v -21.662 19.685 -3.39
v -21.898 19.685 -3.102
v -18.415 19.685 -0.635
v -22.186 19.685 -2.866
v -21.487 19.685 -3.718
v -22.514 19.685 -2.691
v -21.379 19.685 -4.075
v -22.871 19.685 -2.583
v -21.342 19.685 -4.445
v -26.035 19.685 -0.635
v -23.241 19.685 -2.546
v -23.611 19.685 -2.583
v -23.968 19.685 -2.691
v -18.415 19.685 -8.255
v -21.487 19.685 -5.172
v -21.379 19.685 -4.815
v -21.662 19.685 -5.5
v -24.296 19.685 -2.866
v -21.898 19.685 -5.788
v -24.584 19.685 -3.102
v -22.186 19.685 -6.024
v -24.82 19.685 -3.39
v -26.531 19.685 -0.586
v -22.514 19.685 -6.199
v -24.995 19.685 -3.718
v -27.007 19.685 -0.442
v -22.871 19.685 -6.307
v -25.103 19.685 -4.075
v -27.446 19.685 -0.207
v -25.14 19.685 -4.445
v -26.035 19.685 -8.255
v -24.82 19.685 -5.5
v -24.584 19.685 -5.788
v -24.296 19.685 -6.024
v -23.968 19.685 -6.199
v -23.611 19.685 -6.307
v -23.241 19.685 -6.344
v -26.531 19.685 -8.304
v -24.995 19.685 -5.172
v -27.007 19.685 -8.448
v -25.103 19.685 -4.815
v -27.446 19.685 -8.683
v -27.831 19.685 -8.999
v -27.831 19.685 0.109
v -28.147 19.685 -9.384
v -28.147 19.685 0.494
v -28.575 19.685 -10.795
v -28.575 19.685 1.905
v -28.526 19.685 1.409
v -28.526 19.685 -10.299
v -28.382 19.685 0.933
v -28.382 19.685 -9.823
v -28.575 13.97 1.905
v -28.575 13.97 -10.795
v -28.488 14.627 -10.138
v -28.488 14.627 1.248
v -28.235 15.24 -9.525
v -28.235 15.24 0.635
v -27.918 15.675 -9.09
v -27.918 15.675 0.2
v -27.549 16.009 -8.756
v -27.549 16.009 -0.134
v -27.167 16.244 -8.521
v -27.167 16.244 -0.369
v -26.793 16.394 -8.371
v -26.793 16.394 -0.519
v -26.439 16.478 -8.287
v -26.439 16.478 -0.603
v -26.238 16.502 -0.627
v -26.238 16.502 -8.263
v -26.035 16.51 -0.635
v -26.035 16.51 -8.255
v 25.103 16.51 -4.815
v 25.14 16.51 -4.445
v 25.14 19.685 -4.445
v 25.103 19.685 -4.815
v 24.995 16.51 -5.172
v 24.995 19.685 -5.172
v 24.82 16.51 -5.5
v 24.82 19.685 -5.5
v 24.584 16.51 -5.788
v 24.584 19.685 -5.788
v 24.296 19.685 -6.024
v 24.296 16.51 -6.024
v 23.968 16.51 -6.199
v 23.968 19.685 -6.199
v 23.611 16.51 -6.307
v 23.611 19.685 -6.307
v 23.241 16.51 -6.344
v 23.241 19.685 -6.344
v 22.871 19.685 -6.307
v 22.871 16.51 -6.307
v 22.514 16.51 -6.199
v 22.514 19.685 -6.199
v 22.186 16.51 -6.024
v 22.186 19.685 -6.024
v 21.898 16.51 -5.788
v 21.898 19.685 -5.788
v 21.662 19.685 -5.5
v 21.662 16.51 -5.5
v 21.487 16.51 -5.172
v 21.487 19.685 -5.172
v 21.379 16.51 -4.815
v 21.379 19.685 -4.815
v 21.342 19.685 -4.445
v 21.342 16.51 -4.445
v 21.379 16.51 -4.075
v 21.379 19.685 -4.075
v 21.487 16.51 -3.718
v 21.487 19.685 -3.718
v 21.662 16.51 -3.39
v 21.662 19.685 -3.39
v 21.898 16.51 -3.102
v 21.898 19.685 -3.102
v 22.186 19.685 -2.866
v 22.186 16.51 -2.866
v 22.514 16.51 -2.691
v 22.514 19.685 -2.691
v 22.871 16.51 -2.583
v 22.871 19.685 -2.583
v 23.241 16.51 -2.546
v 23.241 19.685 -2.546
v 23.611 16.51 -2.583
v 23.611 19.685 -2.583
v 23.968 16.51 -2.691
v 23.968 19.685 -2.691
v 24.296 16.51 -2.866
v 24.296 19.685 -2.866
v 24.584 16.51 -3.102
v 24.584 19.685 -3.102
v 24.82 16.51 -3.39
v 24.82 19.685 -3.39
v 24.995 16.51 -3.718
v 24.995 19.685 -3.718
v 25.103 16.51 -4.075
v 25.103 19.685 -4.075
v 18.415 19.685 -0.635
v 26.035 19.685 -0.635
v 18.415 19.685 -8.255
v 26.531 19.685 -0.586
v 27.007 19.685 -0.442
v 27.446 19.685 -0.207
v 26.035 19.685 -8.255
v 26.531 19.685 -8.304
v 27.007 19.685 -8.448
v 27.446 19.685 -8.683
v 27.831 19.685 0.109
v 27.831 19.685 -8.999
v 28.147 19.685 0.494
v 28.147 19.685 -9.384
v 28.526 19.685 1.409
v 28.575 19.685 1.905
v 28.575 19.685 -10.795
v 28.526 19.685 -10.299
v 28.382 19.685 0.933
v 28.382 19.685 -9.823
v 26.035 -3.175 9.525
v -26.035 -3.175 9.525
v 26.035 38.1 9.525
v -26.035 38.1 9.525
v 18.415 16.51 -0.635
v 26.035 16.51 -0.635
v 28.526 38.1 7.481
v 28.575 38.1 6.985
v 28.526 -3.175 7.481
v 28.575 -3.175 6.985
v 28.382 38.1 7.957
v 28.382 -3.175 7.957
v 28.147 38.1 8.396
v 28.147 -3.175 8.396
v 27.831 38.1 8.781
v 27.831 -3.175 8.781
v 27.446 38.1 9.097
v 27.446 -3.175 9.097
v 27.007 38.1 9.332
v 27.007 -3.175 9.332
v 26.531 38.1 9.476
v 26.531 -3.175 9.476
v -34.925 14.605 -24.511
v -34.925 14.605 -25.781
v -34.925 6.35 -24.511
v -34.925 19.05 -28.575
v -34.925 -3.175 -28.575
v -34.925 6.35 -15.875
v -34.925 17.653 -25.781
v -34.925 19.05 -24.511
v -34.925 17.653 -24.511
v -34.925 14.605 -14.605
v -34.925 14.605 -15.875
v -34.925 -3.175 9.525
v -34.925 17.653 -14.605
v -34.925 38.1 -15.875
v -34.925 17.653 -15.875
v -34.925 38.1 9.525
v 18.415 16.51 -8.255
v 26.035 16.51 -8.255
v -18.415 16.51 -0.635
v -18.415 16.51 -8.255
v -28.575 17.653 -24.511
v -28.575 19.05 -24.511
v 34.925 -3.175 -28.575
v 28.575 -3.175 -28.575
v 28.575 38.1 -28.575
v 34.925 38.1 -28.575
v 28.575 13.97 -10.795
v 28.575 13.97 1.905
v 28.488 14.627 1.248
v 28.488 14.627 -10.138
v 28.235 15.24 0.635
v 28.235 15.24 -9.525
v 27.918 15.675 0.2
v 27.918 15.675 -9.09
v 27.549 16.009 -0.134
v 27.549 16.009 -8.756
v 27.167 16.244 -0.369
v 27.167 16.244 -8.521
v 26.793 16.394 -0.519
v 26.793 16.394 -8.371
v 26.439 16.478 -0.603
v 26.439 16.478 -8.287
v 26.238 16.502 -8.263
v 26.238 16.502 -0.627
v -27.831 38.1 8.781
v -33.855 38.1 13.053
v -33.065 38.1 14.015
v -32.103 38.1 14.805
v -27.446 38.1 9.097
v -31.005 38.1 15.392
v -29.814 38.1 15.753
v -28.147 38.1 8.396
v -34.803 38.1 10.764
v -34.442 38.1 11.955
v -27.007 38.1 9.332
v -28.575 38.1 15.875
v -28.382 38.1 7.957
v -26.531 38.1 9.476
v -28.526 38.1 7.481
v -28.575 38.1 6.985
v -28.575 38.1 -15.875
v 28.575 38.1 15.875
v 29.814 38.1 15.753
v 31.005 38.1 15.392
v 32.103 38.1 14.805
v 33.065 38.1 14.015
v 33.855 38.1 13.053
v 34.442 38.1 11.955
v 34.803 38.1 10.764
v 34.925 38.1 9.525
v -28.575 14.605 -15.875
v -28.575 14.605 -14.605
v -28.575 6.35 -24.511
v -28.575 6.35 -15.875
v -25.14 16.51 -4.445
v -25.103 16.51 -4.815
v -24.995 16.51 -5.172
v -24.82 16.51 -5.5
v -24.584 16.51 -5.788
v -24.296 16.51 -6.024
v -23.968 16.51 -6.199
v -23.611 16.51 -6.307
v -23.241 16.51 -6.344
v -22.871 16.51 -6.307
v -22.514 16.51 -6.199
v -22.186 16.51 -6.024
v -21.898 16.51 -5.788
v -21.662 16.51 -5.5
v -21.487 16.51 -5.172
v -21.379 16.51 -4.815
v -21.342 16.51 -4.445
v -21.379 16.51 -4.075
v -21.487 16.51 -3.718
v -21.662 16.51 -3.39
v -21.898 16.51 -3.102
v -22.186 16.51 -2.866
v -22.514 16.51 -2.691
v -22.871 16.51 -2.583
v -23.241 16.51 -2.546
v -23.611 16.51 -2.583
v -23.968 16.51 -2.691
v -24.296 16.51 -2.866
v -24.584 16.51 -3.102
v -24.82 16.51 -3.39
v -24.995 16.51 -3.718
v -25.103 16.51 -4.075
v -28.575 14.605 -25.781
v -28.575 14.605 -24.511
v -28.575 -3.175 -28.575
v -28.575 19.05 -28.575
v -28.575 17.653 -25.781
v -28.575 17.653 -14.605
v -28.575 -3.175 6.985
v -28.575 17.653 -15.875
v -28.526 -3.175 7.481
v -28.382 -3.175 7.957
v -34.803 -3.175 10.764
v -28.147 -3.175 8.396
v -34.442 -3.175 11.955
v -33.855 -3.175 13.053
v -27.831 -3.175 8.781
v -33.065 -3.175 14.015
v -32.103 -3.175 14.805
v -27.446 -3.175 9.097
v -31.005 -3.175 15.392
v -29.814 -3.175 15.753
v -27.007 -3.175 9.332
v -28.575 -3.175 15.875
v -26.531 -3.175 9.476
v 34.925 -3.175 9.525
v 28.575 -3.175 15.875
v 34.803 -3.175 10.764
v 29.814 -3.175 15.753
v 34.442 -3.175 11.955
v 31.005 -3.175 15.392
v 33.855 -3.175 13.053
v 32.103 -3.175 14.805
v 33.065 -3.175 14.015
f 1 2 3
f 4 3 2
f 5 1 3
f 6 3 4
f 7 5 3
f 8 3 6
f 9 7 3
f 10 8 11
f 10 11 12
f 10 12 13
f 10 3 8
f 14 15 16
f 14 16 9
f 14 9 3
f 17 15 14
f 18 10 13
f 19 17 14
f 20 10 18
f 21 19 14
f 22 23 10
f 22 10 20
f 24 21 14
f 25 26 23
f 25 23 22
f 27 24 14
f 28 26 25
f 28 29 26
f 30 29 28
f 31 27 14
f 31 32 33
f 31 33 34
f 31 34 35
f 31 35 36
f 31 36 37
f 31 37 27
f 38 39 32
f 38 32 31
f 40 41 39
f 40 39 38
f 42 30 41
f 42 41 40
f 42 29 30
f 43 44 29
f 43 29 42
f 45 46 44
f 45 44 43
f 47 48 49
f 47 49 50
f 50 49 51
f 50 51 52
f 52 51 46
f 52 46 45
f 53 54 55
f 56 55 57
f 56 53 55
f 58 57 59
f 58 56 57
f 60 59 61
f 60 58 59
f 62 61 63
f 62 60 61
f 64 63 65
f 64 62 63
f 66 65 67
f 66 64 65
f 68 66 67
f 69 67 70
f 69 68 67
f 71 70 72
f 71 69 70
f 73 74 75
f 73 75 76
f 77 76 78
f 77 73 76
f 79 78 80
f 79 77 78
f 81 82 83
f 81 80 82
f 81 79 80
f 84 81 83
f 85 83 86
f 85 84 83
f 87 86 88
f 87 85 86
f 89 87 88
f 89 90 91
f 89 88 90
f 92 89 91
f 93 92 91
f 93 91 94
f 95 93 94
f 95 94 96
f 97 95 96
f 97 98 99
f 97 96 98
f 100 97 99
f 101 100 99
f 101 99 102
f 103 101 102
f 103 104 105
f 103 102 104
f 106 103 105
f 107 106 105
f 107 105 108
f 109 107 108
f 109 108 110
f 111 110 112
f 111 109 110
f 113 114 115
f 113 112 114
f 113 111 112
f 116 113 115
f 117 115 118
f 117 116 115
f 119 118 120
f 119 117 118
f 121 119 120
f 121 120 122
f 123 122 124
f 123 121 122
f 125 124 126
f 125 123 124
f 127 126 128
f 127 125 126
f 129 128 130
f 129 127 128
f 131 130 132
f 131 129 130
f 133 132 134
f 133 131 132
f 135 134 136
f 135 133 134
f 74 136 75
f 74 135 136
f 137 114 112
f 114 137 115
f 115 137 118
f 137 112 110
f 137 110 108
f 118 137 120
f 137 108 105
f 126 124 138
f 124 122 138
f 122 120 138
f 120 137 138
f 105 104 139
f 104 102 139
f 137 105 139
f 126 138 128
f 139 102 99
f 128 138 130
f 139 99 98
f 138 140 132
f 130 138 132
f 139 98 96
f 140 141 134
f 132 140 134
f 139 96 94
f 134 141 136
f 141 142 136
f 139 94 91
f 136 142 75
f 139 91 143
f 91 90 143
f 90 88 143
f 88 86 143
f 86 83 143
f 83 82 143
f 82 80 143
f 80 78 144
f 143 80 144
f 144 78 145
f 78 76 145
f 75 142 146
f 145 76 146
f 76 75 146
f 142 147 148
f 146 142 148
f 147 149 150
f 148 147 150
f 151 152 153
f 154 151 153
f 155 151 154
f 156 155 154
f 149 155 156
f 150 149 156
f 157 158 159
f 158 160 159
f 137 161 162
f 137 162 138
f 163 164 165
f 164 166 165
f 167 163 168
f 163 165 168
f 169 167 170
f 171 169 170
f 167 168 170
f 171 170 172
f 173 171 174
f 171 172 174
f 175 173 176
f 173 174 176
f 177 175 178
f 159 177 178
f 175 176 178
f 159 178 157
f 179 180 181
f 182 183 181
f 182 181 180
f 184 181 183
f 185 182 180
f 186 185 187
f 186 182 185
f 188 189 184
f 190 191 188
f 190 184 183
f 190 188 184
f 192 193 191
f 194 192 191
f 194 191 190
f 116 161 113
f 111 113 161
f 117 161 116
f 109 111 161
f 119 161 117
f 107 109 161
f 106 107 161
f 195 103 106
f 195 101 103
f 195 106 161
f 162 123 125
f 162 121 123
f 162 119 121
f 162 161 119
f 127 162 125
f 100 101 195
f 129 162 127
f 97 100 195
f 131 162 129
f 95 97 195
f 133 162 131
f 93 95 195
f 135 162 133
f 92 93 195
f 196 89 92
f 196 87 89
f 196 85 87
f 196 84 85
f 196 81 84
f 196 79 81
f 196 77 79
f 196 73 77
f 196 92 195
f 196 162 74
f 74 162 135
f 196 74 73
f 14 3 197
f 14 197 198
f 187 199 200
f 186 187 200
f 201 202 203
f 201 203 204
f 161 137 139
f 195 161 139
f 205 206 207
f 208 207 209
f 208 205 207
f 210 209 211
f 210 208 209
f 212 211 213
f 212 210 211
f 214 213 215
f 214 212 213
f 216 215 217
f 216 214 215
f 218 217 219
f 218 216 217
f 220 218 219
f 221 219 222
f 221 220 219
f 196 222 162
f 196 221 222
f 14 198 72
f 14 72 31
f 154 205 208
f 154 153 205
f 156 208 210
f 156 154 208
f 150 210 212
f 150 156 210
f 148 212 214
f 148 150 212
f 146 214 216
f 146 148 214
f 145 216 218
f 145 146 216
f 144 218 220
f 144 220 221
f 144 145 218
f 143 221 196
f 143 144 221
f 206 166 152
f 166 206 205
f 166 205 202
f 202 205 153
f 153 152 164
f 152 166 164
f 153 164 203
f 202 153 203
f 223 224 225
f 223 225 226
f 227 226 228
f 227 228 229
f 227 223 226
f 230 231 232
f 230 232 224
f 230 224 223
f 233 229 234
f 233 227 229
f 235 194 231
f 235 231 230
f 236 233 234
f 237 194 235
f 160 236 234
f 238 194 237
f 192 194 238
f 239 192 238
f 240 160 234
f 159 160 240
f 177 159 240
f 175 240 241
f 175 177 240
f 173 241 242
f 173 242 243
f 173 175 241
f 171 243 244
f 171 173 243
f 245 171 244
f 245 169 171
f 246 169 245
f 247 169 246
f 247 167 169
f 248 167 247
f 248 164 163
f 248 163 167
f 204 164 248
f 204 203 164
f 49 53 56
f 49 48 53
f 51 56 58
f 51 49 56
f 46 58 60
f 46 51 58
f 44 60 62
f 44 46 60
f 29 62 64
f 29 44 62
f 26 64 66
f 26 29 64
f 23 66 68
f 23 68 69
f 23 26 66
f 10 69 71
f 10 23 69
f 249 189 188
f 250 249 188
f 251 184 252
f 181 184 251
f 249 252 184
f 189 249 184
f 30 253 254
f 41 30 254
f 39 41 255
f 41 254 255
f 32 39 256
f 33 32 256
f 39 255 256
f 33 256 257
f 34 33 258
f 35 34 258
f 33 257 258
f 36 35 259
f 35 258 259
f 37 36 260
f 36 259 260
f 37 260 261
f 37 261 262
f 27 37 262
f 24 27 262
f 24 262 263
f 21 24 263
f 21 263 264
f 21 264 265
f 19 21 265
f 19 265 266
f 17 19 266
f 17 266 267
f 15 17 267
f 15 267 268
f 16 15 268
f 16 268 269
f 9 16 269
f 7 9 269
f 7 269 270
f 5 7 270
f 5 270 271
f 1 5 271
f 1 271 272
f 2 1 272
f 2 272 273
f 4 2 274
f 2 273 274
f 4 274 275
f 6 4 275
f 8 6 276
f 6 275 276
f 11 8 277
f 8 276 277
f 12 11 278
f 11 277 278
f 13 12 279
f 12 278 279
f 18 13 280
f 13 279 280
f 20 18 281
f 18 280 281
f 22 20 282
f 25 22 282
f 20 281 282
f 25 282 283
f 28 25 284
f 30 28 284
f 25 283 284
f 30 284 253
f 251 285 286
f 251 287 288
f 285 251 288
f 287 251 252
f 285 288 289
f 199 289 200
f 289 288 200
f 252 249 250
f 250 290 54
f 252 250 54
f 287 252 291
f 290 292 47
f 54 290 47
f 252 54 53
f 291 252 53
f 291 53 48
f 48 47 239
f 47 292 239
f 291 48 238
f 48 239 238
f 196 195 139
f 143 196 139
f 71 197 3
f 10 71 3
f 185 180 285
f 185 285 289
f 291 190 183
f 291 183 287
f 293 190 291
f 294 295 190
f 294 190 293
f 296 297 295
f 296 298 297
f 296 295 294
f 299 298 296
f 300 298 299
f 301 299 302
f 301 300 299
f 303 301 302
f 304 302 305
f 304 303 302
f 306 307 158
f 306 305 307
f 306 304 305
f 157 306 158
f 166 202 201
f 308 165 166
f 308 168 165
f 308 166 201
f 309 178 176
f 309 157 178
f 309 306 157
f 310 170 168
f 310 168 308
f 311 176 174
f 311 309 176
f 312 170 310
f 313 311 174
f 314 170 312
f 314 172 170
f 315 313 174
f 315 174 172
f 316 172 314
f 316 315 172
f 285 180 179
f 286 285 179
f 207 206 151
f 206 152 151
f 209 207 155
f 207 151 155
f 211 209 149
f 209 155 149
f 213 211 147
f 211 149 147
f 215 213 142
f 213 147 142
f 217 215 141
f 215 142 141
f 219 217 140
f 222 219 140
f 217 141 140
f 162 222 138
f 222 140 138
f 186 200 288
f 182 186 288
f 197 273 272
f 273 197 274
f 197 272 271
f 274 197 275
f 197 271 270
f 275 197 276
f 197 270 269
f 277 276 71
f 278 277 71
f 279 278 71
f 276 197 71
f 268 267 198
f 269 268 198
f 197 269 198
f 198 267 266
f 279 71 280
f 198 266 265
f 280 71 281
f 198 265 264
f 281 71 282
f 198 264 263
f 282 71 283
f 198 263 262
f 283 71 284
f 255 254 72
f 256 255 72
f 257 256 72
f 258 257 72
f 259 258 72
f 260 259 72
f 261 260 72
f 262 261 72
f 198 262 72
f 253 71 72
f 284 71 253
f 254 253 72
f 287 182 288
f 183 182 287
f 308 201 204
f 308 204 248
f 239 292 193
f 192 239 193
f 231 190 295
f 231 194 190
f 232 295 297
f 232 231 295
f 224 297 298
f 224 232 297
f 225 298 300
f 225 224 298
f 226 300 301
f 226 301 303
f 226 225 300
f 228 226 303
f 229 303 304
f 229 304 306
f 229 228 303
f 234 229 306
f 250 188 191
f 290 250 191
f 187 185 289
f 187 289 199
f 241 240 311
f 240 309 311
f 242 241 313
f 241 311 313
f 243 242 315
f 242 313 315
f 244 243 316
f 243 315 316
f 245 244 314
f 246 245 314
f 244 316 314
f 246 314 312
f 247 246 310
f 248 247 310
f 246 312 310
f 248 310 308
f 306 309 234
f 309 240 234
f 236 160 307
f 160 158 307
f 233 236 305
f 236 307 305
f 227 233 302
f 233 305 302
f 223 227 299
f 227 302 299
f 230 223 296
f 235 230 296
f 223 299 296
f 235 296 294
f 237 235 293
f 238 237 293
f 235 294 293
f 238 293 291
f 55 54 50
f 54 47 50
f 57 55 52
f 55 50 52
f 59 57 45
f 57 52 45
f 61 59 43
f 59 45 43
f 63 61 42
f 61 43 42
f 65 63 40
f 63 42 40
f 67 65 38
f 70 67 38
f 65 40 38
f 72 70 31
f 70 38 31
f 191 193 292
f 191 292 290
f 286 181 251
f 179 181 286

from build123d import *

# Parameters (mm, degrees)
BOSS_EXTRUDE1_DEPTH   = 38.1
SKETCH5_W             = 7.62
SKETCH5_H             = 3.175
BOSS_EXTRUDE2_DEPTH   = 10.16
F_6_CLEARANCE_HOLE1_D = 3.7973
BOSS_EXTRUDE3_DEPTH   = 3.175
FILLET1_R             = 6.35
FILLET2_R             = 2.54
FILLET3_R             = 2.54
FILLET4_R             = 2.54
BOSS_EXTRUDE6_DEPTH   = 6.35
CUT_EXTRUDE1_REACH    = 86.541
SKETCH19_W            = 1.27
SKETCH19_H            = 3.048


with BuildPart() as part:
    # Sketch1 → Boss-Extrude1 (new body)
    with BuildSketch(Plane(origin=(0, 0, 0), x_dir=(1, 0, 0), z_dir=(0, 1, 0))):
        Polygon((-34.925, -15.875), (34.925, -15.875), (34.925, 15.875), (34.925, 28.575), (28.575, 28.575), (28.575, 15.875), (28.575, -9.525), (-28.575, -9.525), (-28.575, 15.875), (-34.925, 15.875), align=None)
    extrude(amount=BOSS_EXTRUDE1_DEPTH)

    # Sketch5 → Boss-Extrude2 (add)
    with BuildSketch(Plane(origin=(-28.575, 0, 0), x_dir=(0, 0, -1), z_dir=(1, 0, 0))):
        with Locations((4.445, 18.0975)):
            Rectangle(SKETCH5_W, SKETCH5_H)
    boss_extrude2 = extrude(amount=BOSS_EXTRUDE2_DEPTH)

    # #6 Clearance Hole1 (through all)
    with Locations(Plane(origin=(0, 19.685, 0), x_dir=(1, 0, 0), z_dir=(0, 1, 0))):
        with Locations((-23.241, 4.445)):
            f_6_clearance_hole1 = Hole(F_6_CLEARANCE_HOLE1_D / 2)

    # Mirror4: Boss-Extrude2, #6 Clearance Hole1 across plane
    add(boss_extrude2.mirror(Plane(origin=(0, 0, 0), x_dir=(0, 0, 1), z_dir=(1, 0, 0))))
    add(f_6_clearance_hole1.mirror(Plane(origin=(0, 0, 0), x_dir=(0, 0, 1), z_dir=(1, 0, 0))), mode=Mode.SUBTRACT)

    # Sketch11 → Boss-Extrude3 (add)
    with BuildSketch(Plane.XZ):
        Polygon((-28.575, -28.575), (-28.575, 9.525), (28.575, 9.525), (28.575, -28.575), (34.925, -28.575), (34.925, 15.875), (-34.925, 15.875), (-34.925, -28.575), align=None)
    extrude(amount=BOSS_EXTRUDE3_DEPTH)

    # Fillet1
    fillet1_edges = [part.edges().sort_by_distance(p)[0] for p in [
        (34.925, 17.4625, 15.875),
        (-34.925, 17.4625, 15.875),
    ]]
    fillet(fillet1_edges, radius=FILLET1_R)

    # Fillet2
    fillet2_edges = [part.edges().sort_by_distance(p)[0] for p in [
        (-28.575, 18.0975, -8.255),
        (-28.575, 18.0975, -0.635),
        (28.575, 18.0975, -0.635),
        (28.575, 18.0975, -8.255),
    ]]
    fillet(fillet2_edges, radius=FILLET2_R)

    # Fillet3
    fillet3_edges = [part.edges().sort_by_distance(p)[0] for p in [
        (-28.575, 16.51, -4.445),
        (28.575, 16.51, -4.445),
    ]]
    fillet(fillet3_edges, radius=FILLET3_R)

    # Fillet4
    fillet4_edges = [part.edges().sort_by_distance(p)[0] for p in [
        (-28.575, 17.4625, 9.525),
        (28.575, 17.4625, 9.525),
    ]]
    fillet(fillet4_edges, radius=FILLET4_R)

    # Sketch18 → Boss-Extrude6 (add)
    with BuildSketch(Plane.ZY.offset(34.925)):
        Polygon((-24.511, 19.05), (-28.575, 19.05), (-28.575, 0), (-15.875, 0), (-15.875, 6.35), (-24.511, 6.35), align=None)
    extrude(amount=-BOSS_EXTRUDE6_DEPTH)

    # Sketch19 → Cut-Extrude1 (cut, up to next)
    with BuildSketch(Plane.ZY.offset(34.925), mode=Mode.PRIVATE) as cut_extrude1_sk1:
        with Locations((-15.24, 16.129)):
            Rectangle(SKETCH19_W, SKETCH19_H)
    cut_extrude1_tool1 = extrude(cut_extrude1_sk1.sketch, amount=-CUT_EXTRUDE1_REACH, mode=Mode.PRIVATE) & part.part
    # Sketch19 → Cut-Extrude1 (cut, up to next)
    with BuildSketch(Plane.ZY.offset(34.925), mode=Mode.PRIVATE) as cut_extrude1_sk2:
        with Locations((-25.146, 16.129)):
            Rectangle(SKETCH19_W, SKETCH19_H)
    cut_extrude1_tool2 = extrude(cut_extrude1_sk2.sketch, amount=-CUT_EXTRUDE1_REACH, mode=Mode.PRIVATE) & part.part
    add(cut_extrude1_tool1.solids().sort_by_distance((-34.925, 16.129, -15.24))[0], mode=Mode.SUBTRACT)
    add(cut_extrude1_tool2.solids().sort_by_distance((-34.925, 16.129, -25.146))[0], mode=Mode.SUBTRACT)


solid = part.part
